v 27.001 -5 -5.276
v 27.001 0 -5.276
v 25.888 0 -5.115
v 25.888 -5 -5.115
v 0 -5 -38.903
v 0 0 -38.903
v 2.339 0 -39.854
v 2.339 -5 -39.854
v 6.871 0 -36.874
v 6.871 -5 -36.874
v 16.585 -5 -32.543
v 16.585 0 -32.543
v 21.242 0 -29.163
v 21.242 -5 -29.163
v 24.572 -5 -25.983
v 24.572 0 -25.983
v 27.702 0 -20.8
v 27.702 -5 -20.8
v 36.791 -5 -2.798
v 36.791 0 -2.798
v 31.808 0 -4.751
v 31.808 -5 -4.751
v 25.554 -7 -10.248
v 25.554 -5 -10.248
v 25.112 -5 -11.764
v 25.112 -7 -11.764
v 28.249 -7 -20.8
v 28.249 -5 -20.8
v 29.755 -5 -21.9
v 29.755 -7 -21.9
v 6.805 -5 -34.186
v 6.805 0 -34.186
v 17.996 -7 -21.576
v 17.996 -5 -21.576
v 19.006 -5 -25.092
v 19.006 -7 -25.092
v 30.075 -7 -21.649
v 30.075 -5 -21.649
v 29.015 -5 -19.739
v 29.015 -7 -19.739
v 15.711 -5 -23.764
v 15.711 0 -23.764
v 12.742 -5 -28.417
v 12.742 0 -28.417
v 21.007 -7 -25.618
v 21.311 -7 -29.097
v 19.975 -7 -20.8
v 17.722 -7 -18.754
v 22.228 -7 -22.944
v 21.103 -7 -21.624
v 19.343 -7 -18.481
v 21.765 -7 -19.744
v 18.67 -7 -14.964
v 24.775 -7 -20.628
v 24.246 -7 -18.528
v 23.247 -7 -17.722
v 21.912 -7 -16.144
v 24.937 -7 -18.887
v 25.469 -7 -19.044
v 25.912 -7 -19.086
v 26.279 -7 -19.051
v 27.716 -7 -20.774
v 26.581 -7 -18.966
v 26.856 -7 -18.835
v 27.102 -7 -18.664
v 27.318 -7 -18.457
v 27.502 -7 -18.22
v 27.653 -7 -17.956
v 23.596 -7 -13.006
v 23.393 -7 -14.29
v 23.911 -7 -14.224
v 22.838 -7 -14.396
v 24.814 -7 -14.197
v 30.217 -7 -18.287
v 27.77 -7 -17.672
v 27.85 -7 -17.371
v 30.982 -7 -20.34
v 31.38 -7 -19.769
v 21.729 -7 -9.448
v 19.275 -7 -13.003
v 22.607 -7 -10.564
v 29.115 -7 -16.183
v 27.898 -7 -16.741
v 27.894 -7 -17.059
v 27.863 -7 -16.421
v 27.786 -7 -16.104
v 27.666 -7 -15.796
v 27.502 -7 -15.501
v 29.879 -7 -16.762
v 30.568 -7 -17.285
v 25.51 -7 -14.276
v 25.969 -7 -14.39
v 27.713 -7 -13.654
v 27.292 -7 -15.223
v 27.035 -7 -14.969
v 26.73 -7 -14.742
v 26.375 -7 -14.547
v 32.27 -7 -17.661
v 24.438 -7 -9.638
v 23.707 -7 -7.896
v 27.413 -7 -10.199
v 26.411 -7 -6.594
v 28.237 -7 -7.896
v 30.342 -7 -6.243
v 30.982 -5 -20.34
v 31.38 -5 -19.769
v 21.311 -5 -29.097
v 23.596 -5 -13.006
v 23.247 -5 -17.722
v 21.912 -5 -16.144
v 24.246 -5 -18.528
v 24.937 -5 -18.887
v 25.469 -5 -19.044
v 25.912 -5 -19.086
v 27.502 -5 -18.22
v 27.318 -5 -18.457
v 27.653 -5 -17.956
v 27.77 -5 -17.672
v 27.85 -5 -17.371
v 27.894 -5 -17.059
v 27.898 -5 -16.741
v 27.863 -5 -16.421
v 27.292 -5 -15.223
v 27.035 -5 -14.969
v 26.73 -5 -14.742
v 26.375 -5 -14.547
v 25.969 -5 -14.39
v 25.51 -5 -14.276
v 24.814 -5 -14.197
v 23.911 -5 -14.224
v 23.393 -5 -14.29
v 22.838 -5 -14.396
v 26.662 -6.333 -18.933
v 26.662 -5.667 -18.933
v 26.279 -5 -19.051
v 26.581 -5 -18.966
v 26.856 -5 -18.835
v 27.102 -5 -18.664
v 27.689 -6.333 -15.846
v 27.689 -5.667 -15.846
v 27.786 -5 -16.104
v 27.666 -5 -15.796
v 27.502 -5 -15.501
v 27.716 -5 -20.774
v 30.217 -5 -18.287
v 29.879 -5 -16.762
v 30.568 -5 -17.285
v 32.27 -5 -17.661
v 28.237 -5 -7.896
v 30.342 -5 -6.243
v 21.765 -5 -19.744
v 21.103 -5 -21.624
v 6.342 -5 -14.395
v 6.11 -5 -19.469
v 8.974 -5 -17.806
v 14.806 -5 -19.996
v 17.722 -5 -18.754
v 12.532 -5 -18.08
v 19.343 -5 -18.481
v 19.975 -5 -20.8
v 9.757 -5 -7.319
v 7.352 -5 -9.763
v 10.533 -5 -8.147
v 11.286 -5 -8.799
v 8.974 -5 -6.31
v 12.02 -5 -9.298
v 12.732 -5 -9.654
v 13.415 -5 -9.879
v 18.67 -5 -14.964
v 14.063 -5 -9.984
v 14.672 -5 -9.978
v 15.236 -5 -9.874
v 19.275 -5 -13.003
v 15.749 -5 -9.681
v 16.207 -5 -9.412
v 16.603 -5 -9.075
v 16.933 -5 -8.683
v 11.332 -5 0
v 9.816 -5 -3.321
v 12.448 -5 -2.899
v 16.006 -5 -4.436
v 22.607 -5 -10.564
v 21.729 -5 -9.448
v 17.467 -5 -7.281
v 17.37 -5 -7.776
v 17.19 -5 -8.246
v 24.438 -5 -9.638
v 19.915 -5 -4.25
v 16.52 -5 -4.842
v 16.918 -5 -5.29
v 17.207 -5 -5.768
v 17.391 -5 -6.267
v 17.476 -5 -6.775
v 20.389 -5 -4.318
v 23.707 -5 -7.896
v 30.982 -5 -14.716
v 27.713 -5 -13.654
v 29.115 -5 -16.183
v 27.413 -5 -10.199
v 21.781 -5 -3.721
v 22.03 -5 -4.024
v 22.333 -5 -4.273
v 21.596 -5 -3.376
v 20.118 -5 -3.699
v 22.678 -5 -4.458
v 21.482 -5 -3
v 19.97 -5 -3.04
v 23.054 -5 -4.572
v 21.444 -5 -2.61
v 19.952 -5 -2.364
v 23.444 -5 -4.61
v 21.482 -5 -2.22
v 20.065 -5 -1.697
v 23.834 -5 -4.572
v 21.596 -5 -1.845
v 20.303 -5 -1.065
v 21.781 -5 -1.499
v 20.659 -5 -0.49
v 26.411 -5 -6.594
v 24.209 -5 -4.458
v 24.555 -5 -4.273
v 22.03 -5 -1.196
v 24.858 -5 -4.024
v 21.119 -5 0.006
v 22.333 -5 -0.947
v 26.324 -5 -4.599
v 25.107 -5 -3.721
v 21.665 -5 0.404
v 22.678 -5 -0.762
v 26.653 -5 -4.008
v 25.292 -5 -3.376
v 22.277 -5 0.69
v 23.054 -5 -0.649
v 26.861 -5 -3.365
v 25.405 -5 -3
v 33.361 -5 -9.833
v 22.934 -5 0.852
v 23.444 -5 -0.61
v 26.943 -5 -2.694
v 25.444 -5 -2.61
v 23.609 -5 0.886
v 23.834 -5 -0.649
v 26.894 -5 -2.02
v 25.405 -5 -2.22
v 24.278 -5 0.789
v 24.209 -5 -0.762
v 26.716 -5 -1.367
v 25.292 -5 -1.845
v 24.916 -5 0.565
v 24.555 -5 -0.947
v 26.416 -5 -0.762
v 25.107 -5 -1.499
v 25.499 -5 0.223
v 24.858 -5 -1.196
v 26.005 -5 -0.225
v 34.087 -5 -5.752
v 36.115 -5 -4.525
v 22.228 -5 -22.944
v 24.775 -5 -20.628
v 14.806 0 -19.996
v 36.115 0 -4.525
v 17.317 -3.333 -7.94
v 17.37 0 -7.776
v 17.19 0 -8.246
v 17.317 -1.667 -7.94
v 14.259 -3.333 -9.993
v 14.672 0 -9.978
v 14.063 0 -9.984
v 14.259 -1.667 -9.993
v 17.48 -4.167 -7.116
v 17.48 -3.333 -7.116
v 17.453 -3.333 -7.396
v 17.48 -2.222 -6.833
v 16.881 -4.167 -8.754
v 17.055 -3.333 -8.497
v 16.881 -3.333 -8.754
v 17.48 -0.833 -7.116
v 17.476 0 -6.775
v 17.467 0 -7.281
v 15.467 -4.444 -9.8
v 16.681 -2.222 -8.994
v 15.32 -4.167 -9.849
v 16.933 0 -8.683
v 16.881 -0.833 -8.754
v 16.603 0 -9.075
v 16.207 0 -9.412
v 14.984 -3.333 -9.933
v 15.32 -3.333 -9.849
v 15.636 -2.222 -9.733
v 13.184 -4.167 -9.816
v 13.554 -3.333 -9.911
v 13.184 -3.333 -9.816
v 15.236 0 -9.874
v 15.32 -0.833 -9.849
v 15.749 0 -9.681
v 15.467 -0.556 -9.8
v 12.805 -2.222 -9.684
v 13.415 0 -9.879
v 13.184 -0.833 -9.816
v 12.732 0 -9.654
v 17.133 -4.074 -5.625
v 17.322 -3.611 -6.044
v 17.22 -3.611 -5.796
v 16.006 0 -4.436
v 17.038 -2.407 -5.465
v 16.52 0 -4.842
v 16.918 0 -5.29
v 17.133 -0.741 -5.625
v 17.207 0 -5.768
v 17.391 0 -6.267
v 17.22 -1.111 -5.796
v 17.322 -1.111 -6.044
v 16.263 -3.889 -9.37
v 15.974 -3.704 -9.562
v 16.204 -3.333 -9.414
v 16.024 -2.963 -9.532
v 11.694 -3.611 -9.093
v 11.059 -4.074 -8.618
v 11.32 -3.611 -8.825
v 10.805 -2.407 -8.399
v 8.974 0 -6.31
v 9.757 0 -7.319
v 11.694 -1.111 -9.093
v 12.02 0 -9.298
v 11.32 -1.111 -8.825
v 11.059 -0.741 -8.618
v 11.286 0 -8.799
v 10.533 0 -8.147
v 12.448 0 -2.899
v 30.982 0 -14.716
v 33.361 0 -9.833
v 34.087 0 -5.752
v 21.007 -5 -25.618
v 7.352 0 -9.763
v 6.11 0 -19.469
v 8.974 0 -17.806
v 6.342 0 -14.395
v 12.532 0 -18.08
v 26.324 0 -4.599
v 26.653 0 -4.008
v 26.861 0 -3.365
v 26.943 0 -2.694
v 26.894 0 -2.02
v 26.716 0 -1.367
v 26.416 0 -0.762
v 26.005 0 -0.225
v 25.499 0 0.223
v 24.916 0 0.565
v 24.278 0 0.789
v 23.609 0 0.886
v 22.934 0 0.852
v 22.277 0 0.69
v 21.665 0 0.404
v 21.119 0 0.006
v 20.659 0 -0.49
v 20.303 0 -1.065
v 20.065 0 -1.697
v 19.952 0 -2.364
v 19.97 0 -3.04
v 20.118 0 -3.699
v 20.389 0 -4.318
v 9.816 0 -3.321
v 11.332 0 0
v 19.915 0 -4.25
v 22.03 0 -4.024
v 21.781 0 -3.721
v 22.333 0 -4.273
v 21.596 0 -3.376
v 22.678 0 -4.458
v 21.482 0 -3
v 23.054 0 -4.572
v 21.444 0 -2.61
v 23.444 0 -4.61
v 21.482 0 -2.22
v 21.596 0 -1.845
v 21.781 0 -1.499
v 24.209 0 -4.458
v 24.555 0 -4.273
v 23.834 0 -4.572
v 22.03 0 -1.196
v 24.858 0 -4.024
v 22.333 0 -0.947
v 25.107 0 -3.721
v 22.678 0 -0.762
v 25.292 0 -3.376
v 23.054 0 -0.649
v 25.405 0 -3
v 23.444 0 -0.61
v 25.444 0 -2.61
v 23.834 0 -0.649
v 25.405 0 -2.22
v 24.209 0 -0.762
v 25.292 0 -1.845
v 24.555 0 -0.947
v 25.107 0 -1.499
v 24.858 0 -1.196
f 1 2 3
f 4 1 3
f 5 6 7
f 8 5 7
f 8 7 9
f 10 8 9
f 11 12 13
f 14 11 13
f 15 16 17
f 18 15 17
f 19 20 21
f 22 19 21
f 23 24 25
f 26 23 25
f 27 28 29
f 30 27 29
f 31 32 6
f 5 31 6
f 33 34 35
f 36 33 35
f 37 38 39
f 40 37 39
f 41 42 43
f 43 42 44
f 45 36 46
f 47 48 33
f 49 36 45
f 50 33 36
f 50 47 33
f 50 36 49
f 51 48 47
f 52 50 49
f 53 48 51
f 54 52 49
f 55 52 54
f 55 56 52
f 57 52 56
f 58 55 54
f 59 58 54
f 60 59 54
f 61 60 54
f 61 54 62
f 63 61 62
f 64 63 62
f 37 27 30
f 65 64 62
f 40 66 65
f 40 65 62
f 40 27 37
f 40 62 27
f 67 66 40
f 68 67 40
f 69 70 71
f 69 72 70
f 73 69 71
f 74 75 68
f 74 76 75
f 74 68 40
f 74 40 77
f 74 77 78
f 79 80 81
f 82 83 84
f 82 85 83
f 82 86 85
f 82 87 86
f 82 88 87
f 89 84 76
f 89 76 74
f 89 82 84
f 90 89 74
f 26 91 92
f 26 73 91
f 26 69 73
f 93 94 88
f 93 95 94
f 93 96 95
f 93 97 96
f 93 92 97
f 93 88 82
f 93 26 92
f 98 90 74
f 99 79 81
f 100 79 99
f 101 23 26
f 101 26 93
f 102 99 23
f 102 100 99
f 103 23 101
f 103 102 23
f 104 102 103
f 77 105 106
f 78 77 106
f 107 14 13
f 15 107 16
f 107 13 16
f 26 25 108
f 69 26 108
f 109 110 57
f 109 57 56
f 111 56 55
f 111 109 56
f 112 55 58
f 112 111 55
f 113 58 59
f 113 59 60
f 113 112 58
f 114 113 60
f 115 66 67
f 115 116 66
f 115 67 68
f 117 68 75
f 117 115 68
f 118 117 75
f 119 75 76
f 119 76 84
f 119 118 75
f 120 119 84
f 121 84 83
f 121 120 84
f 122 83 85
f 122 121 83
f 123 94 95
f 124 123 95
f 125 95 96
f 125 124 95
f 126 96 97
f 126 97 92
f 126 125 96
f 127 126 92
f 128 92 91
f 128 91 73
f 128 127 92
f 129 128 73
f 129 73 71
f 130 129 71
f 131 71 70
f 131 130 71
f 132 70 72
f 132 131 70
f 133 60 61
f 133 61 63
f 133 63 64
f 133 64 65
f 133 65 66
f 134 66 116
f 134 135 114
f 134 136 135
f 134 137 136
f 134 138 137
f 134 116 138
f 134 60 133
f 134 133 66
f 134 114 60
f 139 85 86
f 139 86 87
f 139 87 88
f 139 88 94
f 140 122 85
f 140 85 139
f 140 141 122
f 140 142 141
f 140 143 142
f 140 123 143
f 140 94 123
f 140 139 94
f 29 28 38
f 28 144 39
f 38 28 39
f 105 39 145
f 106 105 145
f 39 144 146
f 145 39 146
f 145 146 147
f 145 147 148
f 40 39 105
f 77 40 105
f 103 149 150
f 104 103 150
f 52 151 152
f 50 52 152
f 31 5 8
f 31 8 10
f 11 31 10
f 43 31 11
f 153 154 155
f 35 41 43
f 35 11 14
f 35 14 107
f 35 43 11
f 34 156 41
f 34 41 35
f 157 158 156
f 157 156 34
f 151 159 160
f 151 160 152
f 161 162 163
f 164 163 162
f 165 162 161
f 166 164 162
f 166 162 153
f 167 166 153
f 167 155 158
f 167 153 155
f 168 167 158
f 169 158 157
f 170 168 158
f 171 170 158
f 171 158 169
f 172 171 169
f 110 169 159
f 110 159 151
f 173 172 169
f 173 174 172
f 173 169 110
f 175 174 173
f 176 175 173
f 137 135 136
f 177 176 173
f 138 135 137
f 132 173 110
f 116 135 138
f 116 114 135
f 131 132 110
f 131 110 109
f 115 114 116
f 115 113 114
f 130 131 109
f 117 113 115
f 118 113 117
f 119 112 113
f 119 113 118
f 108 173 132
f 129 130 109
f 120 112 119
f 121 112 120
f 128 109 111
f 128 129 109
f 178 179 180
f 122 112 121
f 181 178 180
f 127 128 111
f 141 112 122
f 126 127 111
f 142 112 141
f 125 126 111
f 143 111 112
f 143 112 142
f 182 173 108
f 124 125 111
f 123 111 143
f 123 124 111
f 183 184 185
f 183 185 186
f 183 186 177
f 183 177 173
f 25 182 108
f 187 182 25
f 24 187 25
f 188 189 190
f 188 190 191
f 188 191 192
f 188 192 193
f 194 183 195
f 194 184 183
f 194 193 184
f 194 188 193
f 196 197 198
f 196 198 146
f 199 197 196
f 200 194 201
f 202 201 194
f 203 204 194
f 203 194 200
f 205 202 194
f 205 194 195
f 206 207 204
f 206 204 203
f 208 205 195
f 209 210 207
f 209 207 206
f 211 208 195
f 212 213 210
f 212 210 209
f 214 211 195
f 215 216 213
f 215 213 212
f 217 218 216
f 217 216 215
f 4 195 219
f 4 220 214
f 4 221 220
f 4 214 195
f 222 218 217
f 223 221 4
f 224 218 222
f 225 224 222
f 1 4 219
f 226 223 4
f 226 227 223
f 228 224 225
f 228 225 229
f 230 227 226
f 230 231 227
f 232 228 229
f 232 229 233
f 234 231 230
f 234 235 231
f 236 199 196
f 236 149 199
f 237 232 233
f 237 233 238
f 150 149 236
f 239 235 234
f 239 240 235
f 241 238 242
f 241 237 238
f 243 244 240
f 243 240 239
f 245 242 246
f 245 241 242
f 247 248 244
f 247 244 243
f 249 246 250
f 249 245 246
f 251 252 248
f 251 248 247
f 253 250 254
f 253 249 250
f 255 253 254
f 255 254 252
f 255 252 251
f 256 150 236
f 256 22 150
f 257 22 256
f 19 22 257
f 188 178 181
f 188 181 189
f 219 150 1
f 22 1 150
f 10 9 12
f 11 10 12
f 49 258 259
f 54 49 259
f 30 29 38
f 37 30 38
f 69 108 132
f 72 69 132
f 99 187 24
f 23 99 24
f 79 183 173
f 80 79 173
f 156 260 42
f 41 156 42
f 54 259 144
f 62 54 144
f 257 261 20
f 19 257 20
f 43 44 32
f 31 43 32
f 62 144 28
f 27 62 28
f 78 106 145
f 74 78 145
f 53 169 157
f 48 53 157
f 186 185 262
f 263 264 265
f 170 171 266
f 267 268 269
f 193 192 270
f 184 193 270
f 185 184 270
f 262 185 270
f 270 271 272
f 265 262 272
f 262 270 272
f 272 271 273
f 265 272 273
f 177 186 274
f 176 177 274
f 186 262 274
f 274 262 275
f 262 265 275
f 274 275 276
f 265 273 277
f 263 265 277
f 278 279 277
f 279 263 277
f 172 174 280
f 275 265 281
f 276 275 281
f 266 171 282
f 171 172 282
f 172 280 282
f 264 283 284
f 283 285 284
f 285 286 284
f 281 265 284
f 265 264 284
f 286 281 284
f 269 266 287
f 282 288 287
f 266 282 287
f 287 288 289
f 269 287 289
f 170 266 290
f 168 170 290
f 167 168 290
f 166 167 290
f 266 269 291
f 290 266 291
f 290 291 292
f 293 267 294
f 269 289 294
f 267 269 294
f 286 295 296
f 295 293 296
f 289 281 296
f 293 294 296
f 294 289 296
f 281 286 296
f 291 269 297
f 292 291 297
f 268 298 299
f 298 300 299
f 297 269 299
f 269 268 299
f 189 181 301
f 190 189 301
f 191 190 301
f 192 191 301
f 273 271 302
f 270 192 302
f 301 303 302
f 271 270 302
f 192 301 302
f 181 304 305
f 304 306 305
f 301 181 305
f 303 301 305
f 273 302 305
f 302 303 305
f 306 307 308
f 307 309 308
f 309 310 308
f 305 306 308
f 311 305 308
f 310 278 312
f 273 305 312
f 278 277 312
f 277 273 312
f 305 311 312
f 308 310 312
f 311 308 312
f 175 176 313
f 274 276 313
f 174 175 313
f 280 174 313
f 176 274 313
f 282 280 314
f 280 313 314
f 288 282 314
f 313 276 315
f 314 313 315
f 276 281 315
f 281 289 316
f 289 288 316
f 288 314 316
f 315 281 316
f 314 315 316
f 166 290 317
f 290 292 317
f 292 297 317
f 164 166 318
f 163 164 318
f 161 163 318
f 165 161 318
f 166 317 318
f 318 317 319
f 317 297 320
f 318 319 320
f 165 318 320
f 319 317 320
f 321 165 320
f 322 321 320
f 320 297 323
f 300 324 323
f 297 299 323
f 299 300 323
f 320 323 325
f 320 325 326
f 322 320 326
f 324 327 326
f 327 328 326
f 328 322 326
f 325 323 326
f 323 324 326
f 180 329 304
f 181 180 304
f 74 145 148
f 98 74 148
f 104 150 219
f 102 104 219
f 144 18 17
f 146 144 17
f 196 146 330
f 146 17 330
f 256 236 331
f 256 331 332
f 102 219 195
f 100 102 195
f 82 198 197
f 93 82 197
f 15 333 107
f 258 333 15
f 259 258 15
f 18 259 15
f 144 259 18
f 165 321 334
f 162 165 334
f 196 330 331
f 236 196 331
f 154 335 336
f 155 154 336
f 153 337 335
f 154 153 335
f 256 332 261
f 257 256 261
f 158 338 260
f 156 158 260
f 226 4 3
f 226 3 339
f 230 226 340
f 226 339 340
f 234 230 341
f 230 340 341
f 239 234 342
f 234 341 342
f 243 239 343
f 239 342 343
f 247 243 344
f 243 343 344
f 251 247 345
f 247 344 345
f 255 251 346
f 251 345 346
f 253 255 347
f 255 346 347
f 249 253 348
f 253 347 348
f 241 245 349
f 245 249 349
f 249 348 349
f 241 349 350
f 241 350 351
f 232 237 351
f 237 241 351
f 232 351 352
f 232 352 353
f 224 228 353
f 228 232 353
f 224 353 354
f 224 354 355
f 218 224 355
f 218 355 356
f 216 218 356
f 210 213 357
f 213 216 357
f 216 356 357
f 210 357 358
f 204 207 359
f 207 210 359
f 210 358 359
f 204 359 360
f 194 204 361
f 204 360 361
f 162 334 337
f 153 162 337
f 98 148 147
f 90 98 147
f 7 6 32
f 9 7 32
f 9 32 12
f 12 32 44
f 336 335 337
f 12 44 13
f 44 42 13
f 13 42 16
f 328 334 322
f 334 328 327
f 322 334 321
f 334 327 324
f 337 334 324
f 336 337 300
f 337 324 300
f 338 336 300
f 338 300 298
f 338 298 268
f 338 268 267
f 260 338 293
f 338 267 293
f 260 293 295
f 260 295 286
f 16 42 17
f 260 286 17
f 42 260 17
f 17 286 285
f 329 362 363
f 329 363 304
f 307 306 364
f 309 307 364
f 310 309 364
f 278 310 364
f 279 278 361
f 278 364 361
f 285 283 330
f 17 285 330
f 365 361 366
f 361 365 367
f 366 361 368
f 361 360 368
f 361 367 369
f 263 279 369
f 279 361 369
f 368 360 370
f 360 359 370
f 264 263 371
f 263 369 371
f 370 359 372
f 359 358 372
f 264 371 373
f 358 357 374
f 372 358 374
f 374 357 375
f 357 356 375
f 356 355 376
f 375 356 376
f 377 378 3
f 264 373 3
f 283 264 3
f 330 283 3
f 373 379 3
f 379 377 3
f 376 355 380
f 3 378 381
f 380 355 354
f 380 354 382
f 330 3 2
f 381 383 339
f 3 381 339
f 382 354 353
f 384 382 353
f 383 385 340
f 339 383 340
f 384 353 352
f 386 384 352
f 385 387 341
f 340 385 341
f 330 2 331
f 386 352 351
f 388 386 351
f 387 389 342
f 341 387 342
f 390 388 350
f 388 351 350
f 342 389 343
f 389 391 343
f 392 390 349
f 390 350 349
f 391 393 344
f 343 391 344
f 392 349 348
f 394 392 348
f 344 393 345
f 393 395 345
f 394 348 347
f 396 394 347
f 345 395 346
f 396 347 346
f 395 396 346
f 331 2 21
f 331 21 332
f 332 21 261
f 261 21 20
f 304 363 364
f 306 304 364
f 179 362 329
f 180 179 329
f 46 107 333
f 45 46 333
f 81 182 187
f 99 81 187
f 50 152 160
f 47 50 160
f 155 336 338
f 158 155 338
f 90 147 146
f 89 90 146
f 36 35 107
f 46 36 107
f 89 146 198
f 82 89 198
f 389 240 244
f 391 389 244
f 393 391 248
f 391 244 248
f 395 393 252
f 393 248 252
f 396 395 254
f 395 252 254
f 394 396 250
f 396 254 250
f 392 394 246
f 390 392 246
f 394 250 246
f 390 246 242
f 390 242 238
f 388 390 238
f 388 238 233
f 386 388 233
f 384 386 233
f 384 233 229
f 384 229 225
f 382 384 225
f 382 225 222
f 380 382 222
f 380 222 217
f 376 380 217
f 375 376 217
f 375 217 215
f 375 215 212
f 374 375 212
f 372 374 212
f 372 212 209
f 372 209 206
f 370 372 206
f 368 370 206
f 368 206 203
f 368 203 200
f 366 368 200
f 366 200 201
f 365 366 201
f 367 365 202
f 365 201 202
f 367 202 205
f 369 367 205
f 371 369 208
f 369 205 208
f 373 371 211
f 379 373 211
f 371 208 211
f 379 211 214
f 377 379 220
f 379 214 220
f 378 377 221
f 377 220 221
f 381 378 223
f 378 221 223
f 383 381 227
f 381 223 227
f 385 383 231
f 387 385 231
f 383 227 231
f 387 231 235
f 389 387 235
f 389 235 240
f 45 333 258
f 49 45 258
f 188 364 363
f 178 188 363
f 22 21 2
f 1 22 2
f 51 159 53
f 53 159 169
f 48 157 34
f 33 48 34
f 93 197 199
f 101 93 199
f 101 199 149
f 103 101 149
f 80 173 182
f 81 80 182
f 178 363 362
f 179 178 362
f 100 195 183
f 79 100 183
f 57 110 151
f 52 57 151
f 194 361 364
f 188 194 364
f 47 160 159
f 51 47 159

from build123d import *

# Parameters (mm, degrees)
F1_DEPTH = 5
F3_DEPTH = 2
F4_R     = 3.5
F5_DEPTH = 5
F6_R     = 2
F7_DEPTH = 5000


with BuildPart() as f1:
    # F0 (on Front) → F1 (new body)
    with BuildSketch(Plane.XZ):
        with BuildLine():
            Line((19.9153833091, -4.2498749681), (11.3317733631, 0))
            Line((11.3317733631, 0), (9.8158549517, -3.3205298241))
            Line((9.8158549517, -3.3205298241), (12.4476579949, -2.8994414024))
            Line((12.4476579949, -2.8994414024), (16.0058550537, -4.4364142232))
            add(Edge.make_bspline(
                [(16.0058550537, -4.4364142232), (20.2167406678, -7.2366520762), (14.6583728492, -14.2898829654), (8.973678574, -6.310257595)],
                knots=[0, 0, 0, 0, 7.2775541924, 7.2775541924, 7.2775541924, 7.2775541924], degree=3))
            Line((8.973678574, -6.310257595), (7.3524885811, -9.7631821409))
            Line((7.3524885811, -9.7631821409), (6.3418764621, -14.3951550126))
            Line((6.3418764621, -14.3951550126), (6.1102770269, -19.4692704827))
            Line((6.1102770269, -19.4692704827), (8.973678574, -17.8059712052))
            Line((8.973678574, -17.8059712052), (12.5318756327, -18.0796794593))
            Line((12.5318756327, -18.0796794593), (14.805752784, -19.9956316501))
            Line((14.805752784, -19.9956316501), (15.7110933214, -23.7643718719))
            Line((15.7110933214, -23.7643718719), (12.7424206585, -28.4173991531))
            Line((12.7424206585, -28.4173991531), (6.8050744012, -34.1863110662))
            Line((6.8050744012, -34.1863110662), (0, -38.9025583863))
            Line((0, -38.9025583863), (2.3386615794, -39.8540049791))
            Line((2.3386615794, -39.8540049791), (6.8705515005, -36.8744730949))
            Line((6.8705515005, -36.8744730949), (16.5853220969, -32.5428880751))
            Line((16.5853220969, -32.5428880751), (21.242402494, -29.1627496481))
            Line((21.242402494, -29.1627496481), (24.5724655688, -25.9829144925))
            Line((24.5724655688, -25.9829144925), (27.7022235096, -20.8000354469))
            Line((27.7022235096, -20.8000354469), (30.9822093695, -14.7157851607))
            Line((30.9822093695, -14.7157851607), (33.3608239889, -9.8333628848))
            Line((33.3608239889, -9.8333628848), (34.0869277716, -5.7521588169))
            Line((34.0869277716, -5.7521588169), (36.115013063, -4.5252935961))
            Line((36.115013063, -4.5252935961), (36.7910414934, -2.7976669371))
            Line((36.7910414934, -2.7976669371), (31.8084657192, -4.7506359406))
            Line((31.8084657192, -4.7506359406), (27.0011555403, -5.2764355205))
            Line((27.0011555403, -5.2764355205), (19.9153833091, -4.2498749681))
        make_face()
    extrude(amount=F1_DEPTH)

    # F2 (on face) → F3 (join)
    with BuildSketch(Plane.XZ.offset(5)):
        with BuildLine():
            Line((21.7291433364, -9.4480654225), (19.2754138261, -13.0034713075))
            Line((19.2754138261, -13.0034713075), (22.6067081094, -10.5641065165))
            Line((22.6067081094, -10.5641065165), (24.4384426624, -9.6377115697))
            Line((24.4384426624, -9.6377115697), (25.5543254316, -10.2482894436))
            Line((25.5543254316, -10.2482894436), (25.1121837646, -11.7642078549))
            Line((25.1121837646, -11.7642078549), (23.5962662846, -13.0064180121))
            Line((23.5962662846, -13.0064180121), (22.8383075446, -14.3960108981))
            add(Edge.make_bspline(
                [(21.911913529, -16.1435268819), (27.8071500361, -24.3758074939), (31.3442908227, -12.5221665949), (22.8383075446, -14.3960108981)],
                knots=[0, 0, 0, 0, 1.9778821972, 1.9778821972, 1.9778821972, 1.9778821972], degree=3))
            Line((21.911913529, -16.1435268819), (21.7645317316, -19.7438336909))
            Line((21.7645317316, -19.7438336909), (21.1032004239, -21.6240121639))
            Line((21.1032004239, -21.6240121639), (19.9749078602, -20.8000354469))
            Line((19.9749078602, -20.8000354469), (19.3432737142, -18.4805691242))
            Line((19.3432737142, -18.4805691242), (18.669532612, -14.9644799531))
            Line((18.669532612, -14.9644799531), (17.7220832556, -18.7542755157))
            Line((17.7220832556, -18.7542755157), (17.9957915097, -21.5755682439))
            Line((17.9957915097, -21.5755682439), (19.0064031631, -25.0916555524))
            Line((19.0064031631, -25.0916555524), (21.3110515224, -29.0971975582))
            Line((21.3110515224, -29.0971975582), (21.0065729916, -25.6180167198))
            Line((21.0065729916, -25.6180167198), (22.227730602, -22.9441039264))
            Line((22.227730602, -22.9441039264), (24.7753150761, -20.6281188875))
            Line((24.7753150761, -20.6281188875), (27.7164391152, -20.7736660335))
            Line((27.7164391152, -20.7736660335), (29.8788421939, -16.7624897322))
            Line((29.8788421939, -16.7624897322), (29.1153732687, -16.1833055317))
            Line((29.1153732687, -16.1833055317), (27.7132410556, -13.6544601992))
            Line((27.7132410556, -13.6544601992), (27.4127833545, -10.1992078125))
            Line((27.4127833545, -10.1992078125), (28.2366167336, -7.8957052901))
            Line((28.2366167336, -7.8957052901), (30.3422380239, -6.2431930564))
            Line((30.3422380239, -6.2431930564), (26.4112614095, -6.5937256441))
            Line((26.4112614095, -6.5937256441), (23.707151413, -7.8957052901))
            Line((23.707151413, -7.8957052901), (21.7291433364, -9.4480654225))
        make_face()
        Polygon((30.567580834, -17.2849819064), (29.8788421939, -16.7624897322), (27.7164391152, -20.7736660335), (28.2492954284, -20.8000354469), (29.7553811609, -21.899909378), (30.0746022613, -21.6493815286), (29.0152207017, -19.7387114167), (30.9822093695, -20.3396249563), (31.3804323032, -19.7688815121), (30.2170477808, -18.2865038514), (32.2701707482, -17.6605526358), align=None)
    extrude(amount=F3_DEPTH)

    # F4 (on Front) → F5 (join)
    with BuildSketch(Plane.XZ):
        with Locations((23.4437491745, -2.6102589909)):
            Circle(F4_R)
    extrude(amount=F5_DEPTH)

    # F6 (on face) → F7 (cut)
    with BuildSketch(Plane.XZ.offset(5)):
        with Locations((23.4437491745, -2.6102589909)):
            Circle(F6_R)
    extrude(amount=-F7_DEPTH, mode=Mode.SUBTRACT)


solid = f1.part
